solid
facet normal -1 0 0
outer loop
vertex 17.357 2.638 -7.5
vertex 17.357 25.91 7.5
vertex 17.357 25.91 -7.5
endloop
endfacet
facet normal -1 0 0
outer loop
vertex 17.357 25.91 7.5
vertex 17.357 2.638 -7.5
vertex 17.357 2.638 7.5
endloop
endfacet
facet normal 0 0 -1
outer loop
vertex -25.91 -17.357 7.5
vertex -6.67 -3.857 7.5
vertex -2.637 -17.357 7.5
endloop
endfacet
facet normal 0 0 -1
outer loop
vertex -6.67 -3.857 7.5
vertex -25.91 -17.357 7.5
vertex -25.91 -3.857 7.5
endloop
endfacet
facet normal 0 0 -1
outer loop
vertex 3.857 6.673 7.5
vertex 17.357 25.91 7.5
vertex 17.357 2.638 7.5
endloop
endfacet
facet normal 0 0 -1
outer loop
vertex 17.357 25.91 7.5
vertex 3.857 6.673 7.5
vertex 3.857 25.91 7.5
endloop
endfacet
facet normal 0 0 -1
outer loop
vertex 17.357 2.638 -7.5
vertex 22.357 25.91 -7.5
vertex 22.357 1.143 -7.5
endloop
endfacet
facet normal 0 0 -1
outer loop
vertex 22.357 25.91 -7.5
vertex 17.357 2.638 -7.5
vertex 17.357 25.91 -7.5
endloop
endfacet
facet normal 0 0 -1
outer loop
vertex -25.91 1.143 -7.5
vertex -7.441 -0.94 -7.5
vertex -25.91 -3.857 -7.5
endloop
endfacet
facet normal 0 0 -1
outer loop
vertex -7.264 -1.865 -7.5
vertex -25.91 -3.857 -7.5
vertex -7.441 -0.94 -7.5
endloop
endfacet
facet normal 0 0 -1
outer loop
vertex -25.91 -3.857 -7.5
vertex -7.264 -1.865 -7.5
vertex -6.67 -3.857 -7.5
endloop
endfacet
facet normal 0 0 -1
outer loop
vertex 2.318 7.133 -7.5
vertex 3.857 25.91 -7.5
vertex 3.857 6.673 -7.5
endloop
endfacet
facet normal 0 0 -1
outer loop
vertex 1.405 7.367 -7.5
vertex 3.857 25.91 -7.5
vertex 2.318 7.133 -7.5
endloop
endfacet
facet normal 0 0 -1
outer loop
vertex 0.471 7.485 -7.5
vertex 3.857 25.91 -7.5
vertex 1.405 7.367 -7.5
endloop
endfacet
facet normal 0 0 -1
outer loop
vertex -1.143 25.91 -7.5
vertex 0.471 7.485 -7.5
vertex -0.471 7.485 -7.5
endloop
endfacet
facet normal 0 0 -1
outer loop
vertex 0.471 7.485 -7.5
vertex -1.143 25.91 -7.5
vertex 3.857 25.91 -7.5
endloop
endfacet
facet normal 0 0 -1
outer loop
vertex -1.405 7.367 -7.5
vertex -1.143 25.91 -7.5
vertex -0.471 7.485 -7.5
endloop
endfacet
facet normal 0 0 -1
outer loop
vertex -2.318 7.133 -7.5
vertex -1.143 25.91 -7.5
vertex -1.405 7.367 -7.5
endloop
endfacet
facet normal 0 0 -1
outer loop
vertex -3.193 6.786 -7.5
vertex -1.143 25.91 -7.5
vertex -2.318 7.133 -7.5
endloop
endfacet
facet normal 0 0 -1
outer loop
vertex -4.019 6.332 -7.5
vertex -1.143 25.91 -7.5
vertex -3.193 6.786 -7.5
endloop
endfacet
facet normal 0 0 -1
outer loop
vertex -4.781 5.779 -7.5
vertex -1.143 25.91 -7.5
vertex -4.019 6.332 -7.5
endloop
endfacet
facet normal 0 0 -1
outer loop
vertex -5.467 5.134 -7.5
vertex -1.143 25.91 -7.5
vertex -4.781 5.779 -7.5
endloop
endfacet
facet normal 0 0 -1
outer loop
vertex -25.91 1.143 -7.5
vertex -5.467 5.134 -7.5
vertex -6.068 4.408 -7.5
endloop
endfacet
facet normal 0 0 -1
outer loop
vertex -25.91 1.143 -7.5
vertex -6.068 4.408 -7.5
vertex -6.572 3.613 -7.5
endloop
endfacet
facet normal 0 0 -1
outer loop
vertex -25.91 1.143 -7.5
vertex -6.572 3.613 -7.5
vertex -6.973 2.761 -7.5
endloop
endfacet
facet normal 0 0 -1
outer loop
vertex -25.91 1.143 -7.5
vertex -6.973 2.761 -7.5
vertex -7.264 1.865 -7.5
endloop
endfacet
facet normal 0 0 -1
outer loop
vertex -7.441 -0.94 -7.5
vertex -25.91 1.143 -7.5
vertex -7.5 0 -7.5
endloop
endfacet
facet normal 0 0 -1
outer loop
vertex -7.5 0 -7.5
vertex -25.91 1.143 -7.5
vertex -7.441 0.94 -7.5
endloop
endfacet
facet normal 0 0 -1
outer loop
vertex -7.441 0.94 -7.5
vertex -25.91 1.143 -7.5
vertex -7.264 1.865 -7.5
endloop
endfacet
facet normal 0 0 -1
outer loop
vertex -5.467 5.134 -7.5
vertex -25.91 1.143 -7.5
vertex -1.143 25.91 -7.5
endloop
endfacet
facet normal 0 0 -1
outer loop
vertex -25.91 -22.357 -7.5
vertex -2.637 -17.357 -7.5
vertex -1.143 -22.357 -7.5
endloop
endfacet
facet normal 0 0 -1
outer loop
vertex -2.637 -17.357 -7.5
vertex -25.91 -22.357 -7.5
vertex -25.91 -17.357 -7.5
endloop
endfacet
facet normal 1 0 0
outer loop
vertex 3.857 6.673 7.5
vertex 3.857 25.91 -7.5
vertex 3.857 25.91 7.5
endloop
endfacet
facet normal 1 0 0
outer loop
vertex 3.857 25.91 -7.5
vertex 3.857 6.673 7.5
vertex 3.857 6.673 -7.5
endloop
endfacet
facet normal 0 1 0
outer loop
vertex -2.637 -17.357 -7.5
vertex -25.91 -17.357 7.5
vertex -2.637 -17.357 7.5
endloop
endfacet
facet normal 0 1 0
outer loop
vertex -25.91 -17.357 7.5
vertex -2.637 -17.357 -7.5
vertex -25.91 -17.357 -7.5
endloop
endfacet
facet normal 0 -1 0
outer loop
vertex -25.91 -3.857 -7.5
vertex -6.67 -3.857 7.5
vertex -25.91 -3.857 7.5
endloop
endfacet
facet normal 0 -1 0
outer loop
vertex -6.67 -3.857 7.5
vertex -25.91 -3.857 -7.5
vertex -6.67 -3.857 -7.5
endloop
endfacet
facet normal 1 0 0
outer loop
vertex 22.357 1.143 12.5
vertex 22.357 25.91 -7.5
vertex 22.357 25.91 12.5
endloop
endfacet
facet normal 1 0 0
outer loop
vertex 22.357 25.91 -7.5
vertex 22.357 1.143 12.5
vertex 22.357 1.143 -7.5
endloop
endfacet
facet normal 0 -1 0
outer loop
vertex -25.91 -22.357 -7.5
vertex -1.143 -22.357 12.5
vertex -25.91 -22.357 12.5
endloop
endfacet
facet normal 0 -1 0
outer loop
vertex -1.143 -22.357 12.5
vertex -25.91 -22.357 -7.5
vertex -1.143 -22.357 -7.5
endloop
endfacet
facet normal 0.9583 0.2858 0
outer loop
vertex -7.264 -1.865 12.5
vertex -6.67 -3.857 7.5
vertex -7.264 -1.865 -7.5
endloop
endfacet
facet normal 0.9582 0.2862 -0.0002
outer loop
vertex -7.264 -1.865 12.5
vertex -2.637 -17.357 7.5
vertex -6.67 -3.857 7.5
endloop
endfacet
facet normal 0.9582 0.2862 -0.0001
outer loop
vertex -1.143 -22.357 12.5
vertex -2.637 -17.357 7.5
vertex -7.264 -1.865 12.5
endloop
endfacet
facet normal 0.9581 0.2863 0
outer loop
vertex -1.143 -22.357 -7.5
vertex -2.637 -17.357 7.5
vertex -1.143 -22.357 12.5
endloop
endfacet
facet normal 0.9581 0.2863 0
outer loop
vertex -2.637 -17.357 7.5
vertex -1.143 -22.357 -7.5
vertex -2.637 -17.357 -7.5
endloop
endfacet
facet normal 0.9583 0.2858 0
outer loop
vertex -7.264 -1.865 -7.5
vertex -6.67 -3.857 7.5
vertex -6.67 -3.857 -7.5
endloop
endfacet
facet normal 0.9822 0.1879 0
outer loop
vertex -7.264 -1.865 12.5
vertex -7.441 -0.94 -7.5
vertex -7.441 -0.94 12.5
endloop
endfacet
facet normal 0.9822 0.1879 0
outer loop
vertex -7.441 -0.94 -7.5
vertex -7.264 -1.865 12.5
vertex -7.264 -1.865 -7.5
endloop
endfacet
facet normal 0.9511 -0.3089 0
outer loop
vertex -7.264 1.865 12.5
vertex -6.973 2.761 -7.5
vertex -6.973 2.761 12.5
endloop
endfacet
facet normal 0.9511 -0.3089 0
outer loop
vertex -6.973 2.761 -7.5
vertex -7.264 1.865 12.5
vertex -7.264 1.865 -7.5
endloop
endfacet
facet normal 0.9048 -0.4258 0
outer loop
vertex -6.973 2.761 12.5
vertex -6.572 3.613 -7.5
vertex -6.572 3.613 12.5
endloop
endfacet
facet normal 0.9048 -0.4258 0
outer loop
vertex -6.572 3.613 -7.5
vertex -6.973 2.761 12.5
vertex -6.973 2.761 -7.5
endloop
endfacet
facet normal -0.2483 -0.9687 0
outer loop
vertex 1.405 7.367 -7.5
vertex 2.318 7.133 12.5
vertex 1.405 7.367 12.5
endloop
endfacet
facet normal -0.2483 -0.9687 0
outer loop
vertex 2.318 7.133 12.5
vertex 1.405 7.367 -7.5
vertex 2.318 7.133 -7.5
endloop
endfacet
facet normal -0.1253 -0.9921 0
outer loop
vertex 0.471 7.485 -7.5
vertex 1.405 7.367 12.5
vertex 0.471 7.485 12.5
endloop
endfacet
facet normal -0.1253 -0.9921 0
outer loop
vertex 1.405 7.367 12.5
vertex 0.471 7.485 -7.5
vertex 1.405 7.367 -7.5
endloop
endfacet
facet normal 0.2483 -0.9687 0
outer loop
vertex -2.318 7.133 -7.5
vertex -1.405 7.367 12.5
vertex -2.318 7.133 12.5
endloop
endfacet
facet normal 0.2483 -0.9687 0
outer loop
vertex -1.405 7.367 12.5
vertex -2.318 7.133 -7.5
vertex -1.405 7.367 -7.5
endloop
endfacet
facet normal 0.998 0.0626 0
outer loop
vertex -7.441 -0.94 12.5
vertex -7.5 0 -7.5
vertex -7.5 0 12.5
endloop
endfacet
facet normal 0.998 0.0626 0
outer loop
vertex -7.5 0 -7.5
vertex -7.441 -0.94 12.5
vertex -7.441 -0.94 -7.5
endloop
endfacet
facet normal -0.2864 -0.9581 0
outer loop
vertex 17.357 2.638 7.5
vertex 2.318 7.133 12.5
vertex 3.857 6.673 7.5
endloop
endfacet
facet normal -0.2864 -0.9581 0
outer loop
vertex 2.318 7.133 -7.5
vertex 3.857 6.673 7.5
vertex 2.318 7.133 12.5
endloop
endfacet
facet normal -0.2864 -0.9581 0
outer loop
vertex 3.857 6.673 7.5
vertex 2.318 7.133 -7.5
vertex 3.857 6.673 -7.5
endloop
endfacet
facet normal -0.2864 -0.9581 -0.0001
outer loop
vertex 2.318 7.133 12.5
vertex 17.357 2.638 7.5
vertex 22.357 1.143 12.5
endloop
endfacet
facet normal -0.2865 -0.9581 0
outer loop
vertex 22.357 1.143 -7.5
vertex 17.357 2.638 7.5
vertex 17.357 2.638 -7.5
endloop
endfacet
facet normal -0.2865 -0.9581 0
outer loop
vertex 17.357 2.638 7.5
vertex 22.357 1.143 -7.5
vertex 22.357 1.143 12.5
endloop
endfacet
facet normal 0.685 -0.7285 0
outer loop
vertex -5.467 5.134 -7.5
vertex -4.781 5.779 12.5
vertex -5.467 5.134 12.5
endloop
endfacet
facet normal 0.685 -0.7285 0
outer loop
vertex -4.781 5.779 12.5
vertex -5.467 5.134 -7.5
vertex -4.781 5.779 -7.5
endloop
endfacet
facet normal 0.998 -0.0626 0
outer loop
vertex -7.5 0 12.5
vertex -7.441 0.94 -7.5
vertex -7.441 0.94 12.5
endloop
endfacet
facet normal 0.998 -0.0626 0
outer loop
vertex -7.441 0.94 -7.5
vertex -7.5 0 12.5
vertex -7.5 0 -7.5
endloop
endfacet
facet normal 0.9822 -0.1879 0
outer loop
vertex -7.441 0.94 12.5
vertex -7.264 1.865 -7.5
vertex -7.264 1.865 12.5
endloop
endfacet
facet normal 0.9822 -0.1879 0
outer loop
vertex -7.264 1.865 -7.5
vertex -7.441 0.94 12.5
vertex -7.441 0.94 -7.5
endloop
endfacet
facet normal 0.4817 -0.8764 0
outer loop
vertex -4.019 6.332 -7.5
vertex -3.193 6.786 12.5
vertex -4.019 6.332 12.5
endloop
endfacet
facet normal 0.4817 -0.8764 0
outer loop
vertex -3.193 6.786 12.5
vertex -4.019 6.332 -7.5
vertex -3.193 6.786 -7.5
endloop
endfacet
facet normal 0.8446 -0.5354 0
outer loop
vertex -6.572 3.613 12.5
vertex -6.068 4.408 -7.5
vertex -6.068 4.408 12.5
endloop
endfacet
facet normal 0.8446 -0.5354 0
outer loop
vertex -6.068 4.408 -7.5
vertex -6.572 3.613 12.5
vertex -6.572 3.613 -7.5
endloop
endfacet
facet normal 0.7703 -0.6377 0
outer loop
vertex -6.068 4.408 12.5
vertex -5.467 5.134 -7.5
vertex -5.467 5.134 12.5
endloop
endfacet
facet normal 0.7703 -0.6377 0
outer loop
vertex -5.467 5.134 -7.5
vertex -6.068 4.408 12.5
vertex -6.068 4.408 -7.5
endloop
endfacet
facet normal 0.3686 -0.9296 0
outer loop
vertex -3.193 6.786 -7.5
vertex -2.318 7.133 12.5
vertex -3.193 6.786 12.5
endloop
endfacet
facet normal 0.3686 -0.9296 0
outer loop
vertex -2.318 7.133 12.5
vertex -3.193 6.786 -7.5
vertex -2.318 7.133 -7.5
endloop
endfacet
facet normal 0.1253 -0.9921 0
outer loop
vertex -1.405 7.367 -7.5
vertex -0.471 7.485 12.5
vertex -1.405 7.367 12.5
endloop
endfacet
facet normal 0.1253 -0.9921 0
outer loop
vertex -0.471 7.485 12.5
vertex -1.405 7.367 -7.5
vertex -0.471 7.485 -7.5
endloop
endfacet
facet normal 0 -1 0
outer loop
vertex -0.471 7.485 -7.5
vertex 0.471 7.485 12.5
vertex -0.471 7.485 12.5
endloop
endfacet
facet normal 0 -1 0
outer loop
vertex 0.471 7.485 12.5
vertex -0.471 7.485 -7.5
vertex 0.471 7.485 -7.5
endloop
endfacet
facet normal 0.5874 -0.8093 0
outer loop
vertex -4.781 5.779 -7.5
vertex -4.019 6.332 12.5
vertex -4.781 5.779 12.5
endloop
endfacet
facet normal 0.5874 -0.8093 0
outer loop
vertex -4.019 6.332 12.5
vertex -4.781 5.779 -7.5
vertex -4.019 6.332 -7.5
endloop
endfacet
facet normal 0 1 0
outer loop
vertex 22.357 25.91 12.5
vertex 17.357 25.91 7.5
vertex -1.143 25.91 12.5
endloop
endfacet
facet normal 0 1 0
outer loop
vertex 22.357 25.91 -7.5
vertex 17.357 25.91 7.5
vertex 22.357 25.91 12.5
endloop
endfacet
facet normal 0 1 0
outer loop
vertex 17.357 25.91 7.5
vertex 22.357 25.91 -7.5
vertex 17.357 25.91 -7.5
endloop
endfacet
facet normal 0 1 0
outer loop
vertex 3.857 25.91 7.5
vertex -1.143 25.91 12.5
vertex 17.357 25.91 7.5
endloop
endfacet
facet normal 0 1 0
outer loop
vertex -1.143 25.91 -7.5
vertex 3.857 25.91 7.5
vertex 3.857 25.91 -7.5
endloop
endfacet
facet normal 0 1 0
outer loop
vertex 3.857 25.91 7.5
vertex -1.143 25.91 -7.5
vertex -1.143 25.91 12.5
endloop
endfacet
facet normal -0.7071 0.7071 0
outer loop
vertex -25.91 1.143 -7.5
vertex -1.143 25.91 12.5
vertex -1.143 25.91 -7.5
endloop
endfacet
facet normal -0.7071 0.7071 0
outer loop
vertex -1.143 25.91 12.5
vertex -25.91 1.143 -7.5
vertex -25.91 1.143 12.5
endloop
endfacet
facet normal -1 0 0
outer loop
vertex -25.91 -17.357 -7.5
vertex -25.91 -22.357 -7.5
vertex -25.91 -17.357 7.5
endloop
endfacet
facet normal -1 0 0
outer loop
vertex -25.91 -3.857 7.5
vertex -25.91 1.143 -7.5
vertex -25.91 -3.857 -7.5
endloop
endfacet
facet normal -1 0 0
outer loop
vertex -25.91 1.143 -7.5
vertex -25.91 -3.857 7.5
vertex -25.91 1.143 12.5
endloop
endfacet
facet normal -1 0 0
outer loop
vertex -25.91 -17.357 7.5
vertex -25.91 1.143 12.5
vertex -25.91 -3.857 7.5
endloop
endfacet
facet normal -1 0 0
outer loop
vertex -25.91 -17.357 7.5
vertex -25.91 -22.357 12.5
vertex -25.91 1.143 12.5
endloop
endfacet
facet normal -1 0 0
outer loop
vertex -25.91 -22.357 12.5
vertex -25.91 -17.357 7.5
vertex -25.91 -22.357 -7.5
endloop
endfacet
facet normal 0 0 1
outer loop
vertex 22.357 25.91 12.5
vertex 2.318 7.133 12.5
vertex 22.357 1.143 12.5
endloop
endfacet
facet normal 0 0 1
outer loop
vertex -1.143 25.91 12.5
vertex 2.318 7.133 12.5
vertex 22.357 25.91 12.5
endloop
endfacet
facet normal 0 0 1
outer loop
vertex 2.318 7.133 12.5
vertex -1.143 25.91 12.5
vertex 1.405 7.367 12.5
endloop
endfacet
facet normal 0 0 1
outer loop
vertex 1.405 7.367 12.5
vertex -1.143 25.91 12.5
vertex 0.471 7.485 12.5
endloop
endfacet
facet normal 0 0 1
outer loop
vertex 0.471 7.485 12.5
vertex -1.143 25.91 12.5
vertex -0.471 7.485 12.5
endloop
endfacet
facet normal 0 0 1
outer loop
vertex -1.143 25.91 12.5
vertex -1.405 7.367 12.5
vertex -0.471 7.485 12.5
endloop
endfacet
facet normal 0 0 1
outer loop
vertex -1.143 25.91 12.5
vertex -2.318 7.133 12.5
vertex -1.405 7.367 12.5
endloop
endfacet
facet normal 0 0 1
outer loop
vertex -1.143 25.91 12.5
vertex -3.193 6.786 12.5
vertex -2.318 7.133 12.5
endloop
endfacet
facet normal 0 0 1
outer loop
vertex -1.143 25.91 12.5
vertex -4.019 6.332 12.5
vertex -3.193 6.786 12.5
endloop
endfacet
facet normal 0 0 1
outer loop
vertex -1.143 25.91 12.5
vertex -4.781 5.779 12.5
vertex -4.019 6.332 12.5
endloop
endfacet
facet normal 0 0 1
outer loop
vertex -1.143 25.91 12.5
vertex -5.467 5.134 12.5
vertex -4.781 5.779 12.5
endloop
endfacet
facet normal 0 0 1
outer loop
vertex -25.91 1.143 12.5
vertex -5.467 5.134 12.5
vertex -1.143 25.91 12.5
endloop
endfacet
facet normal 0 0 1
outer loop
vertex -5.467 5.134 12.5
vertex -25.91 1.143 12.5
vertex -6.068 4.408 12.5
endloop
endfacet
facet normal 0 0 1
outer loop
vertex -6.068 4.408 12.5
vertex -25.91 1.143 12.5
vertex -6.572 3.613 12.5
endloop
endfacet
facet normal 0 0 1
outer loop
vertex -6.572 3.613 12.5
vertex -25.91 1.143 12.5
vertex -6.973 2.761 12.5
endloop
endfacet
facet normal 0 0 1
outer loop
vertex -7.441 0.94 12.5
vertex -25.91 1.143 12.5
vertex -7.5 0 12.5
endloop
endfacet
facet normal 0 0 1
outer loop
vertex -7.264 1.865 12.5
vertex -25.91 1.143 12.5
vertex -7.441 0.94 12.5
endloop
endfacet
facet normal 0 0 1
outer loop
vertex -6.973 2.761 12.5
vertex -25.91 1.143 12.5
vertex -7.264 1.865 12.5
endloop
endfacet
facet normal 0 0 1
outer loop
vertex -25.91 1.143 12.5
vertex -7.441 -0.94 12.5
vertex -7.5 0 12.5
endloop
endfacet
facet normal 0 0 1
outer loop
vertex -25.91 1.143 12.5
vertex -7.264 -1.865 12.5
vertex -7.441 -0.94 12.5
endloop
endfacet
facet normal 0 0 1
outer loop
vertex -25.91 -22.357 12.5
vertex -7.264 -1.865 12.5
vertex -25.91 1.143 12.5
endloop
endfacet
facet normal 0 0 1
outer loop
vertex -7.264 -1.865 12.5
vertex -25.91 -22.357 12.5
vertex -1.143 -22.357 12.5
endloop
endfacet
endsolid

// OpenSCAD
LIP_WIDTH = 13.5;
LIP_THICKNESS = 10;
ROD_DIA = 15;
ROD_OFFSET = 15;

THICKNESS = 5;
HEIGHT = 15;
WIDTH = 20;

$fn = 50;

module lip_n_rod() {
    off = ROD_OFFSET/sqrt(2);
    union() {
        translate([off, off, 0])
        cube(size = [LIP_WIDTH, WIDTH + 2 * off + LIP_WIDTH, HEIGHT], center = true);

        rotate([0, 0, 90])
        translate([-off, off, 0])
        cube(size = [LIP_WIDTH, WIDTH + 2 * off + LIP_WIDTH, HEIGHT], center = true);
 
        hull() {
            cylinder(d = ROD_DIA, h = 2 * HEIGHT, center = true);
            
            w = LIP_WIDTH + 2 * THICKNESS;
            translate([off, -off, 0])
            cube(size = [w, w, 2 * HEIGHT], center = true);
        }
   }
}

module body() {
    off = ROD_OFFSET/sqrt(2);
    w = LIP_WIDTH + 2 * THICKNESS;
    l = WIDTH + off;
    h = HEIGHT + THICKNESS;
    hull() {
        translate([off, off, THICKNESS/2])
        cube(size = [w, l, h], center = true);

        rotate([0, 0, 90])
        translate([-off, off, THICKNESS/2])
        cube(size = [w, l, h], center = true);
    }
}

difference() {
    body();
    #lip_n_rod();
}
